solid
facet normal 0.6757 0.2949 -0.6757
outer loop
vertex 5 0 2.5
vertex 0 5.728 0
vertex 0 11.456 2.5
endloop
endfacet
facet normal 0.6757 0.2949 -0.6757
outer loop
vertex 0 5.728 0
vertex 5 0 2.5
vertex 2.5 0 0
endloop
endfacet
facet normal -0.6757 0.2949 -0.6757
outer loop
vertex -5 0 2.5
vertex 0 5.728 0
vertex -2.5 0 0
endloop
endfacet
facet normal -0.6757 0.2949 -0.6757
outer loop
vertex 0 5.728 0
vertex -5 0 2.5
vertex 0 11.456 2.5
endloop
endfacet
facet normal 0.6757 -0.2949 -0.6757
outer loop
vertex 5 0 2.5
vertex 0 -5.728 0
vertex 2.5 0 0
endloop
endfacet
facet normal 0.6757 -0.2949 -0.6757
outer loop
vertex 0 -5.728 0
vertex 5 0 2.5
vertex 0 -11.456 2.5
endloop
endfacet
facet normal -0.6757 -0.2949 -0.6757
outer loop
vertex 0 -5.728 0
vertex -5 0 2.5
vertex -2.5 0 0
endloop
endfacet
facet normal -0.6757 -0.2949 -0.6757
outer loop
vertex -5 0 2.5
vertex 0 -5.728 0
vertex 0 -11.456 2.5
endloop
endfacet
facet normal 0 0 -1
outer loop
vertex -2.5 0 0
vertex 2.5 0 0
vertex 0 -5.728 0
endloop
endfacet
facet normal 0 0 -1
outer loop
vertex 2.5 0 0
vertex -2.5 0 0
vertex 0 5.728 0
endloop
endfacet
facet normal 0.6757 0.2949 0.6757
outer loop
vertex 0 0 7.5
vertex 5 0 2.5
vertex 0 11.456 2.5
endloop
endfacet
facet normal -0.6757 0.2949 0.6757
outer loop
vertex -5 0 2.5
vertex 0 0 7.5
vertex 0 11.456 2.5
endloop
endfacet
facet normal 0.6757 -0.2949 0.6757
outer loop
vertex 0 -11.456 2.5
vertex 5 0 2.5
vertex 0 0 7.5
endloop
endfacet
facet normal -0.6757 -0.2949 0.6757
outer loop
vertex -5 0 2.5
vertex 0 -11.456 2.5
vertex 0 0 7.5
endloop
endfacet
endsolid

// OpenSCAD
/*
 * Copyright 2022 Code and Make (codeandmake.com)
 * 
 * Permission is hereby granted, free of charge, to any person obtaining a copy
 * of this software and associated documentation files (the "Software"), to deal
 * in the Software without restriction, including without limitation the rights
 * to use, copy, modify, merge, publish, distribute, sublicense, and/or sell
 * copies of the Software, and to permit persons to whom the Software is
 * furnished to do so, subject to the following conditions:
 * 
 * The above copyright notice and this permission notice shall be included in
 * all copies or substantial portions of the Software.
 * 
 * THE SOFTWARE IS PROVIDED "AS IS", WITHOUT WARRANTY OF ANY KIND, EXPRESS OR
 * IMPLIED, INCLUDING BUT NOT LIMITED TO THE WARRANTIES OF MERCHANTABILITY,
 * FITNESS FOR A PARTICULAR PURPOSE AND NONINFRINGEMENT. IN NO EVENT SHALL THE
 * AUTHORS OR COPYRIGHT HOLDERS BE LIABLE FOR ANY CLAIM, DAMAGES OR OTHER
 * LIABILITY, WHETHER IN AN ACTION OF CONTRACT, TORT OR OTHERWISE, ARISING FROM,
 * OUT OF OR IN CONNECTION WITH THE SOFTWARE OR THE USE OR OTHER DEALINGS IN THE
 * SOFTWARE.
 */

/*
 * Gem Generator by Code and Make (https://codeandmake.com/)
 *
 * https://codeandmake.com/post/gem-generator
 *
 * Gem Generator v1.1 (29 January 2022)
 */

/* [General] */

// Length of each side
Side_Length = 12.5;

// Width point to point (narrow dimension)
Width = 10;

// Number of sides
Sides = 4; // [3:1:12]

// Computed: long diagonal from side length and width
Diameter = 2 * sqrt(pow(Side_Length, 2) - pow(Width / 2, 2));

// Scale factor to narrow the shape
_scale_x = Width / Diameter;

/* [Bottom] */

// Uncut height of bottom section
Bottom_Height = 5; // [1:1:100]

// Percentage to cut from bottom section
Bottom_Cutoff_Percent = 50; // [0:1:100]

/* [Middle] */

// Height of middle section
Middle_Height = 0; // [0:1:100]

/* [Top] */

// Uncut height of top section
Top_Height = 5; // [1:1:100]

// Percentage to cut from top section
Top_Cutoff_Percent = 0; // [0:1:100]

/* [Printing] */

// Rotate onto face for easier printing
Orientation = 0; // [0:Upright, 1:Bottom Side, 2:Side, 3:Top Side, 4:Upsidedown]

/* [Preview] */

// Show uncut ends in preview mode
Show_Uncut_Ends = 0; // [0:No, 1:Yes]

module GemGenerator() {
  radius = Diameter / 2;
  apothem = radius * cos(180 / Sides);

  if(Orientation == 0) {
    translate([0, 0, (Bottom_Height * ((100 - Bottom_Cutoff_Percent) / 100)) + Middle_Height]) {
      mirror([0, 0, 1]) {
        gem();
      }
    }
  } else if(Orientation == 1) {
    mirror([1, 0, 0]) {
      // rotate flat
      rotate([0, 180 - atan(Bottom_Height / apothem), 0]) {
        // shift
        translate([-apothem * ((Bottom_Cutoff_Percent) / 100), 0, -((Bottom_Height * ((100 - Bottom_Cutoff_Percent) / 100)) + Middle_Height)]) {
          // rotate onto flat side
          rotate([0, 0, 180 / Sides]) {
            gem();
          }
        }
      }
    }
  } else if(Orientation == 2) {
    mirror([1, 0, 0]) {
      // shift
      translate([Bottom_Height * ((Bottom_Cutoff_Percent) / 100), 0, apothem]) {
        // rotate flat
        rotate([0, 90, 0]) {
          // shift down
          translate([0, 0, -(Bottom_Height + Middle_Height)]) {
            // rotate onto flat side
            rotate([0, 0, 180 / Sides]) {
              gem();
            }
          }
        }
      }
    }
  } else if(Orientation == 3) {
    // rotate flat
    rotate([0, atan(Top_Height / apothem), 0]) {
      // shift
      translate([-apothem * ((Top_Cutoff_Percent) / 100), 0, Top_Height * ((100 - Top_Cutoff_Percent) / 100)]) {
        // rotate onto flat side
        rotate([0, 0, 180 / Sides]) {
          gem();
        }
      }
    }
  } else if(Orientation == 4) {
    translate([0, 0, Top_Height * ((100 - Top_Cutoff_Percent) / 100)]) {
      gem();
    }
  }

  module gem() {
    // bottom
    translate([0, 0, Middle_Height]) {
      if (Show_Uncut_Ends) {
        %translate([0, 0, Bottom_Height * ((100 - Bottom_Cutoff_Percent) / 100)]) {
          cylinder(d1=Diameter * ((Bottom_Cutoff_Percent) / 100), d2=0, h=Bottom_Height * ((Bottom_Cutoff_Percent) / 100), $fn=Sides);
        }
      }
      intersection() {
        cylinder(d1=Diameter, d2=0, h=Bottom_Height, $fn=Sides);
        cylinder(d=Diameter, h=Bottom_Height * ((100 - Bottom_Cutoff_Percent) / 100), $fn=Sides);
      }
    }

    // middle
    cylinder(d=Diameter, h=Middle_Height, $fn=Sides);

    // top
    rotate([0, 180, 0]) {
      mirror([1, 0, 0]) {
        if (Show_Uncut_Ends) {
          %translate([0, 0, Top_Height * ((100 - Top_Cutoff_Percent) / 100)]) {
            cylinder(d1=Diameter * ((Top_Cutoff_Percent) / 100), d2=0, h=Top_Height * ((Top_Cutoff_Percent) / 100), $fn=Sides);
          }
        }

        intersection() {
          cylinder(d1=Diameter, d2=0, h=Top_Height, $fn=Sides);
          cylinder(d=Diameter, h=Top_Height * ((100 - Top_Cutoff_Percent) / 100), $fn=Sides);
        }
      }
    }
  }
}

scale([_scale_x, 1, 1]) GemGenerator();

echo("\r\tThis design is completely free and shared under a permissive license.\r\tYour support is hugely appreciated: codeandmake.com/support\r");
